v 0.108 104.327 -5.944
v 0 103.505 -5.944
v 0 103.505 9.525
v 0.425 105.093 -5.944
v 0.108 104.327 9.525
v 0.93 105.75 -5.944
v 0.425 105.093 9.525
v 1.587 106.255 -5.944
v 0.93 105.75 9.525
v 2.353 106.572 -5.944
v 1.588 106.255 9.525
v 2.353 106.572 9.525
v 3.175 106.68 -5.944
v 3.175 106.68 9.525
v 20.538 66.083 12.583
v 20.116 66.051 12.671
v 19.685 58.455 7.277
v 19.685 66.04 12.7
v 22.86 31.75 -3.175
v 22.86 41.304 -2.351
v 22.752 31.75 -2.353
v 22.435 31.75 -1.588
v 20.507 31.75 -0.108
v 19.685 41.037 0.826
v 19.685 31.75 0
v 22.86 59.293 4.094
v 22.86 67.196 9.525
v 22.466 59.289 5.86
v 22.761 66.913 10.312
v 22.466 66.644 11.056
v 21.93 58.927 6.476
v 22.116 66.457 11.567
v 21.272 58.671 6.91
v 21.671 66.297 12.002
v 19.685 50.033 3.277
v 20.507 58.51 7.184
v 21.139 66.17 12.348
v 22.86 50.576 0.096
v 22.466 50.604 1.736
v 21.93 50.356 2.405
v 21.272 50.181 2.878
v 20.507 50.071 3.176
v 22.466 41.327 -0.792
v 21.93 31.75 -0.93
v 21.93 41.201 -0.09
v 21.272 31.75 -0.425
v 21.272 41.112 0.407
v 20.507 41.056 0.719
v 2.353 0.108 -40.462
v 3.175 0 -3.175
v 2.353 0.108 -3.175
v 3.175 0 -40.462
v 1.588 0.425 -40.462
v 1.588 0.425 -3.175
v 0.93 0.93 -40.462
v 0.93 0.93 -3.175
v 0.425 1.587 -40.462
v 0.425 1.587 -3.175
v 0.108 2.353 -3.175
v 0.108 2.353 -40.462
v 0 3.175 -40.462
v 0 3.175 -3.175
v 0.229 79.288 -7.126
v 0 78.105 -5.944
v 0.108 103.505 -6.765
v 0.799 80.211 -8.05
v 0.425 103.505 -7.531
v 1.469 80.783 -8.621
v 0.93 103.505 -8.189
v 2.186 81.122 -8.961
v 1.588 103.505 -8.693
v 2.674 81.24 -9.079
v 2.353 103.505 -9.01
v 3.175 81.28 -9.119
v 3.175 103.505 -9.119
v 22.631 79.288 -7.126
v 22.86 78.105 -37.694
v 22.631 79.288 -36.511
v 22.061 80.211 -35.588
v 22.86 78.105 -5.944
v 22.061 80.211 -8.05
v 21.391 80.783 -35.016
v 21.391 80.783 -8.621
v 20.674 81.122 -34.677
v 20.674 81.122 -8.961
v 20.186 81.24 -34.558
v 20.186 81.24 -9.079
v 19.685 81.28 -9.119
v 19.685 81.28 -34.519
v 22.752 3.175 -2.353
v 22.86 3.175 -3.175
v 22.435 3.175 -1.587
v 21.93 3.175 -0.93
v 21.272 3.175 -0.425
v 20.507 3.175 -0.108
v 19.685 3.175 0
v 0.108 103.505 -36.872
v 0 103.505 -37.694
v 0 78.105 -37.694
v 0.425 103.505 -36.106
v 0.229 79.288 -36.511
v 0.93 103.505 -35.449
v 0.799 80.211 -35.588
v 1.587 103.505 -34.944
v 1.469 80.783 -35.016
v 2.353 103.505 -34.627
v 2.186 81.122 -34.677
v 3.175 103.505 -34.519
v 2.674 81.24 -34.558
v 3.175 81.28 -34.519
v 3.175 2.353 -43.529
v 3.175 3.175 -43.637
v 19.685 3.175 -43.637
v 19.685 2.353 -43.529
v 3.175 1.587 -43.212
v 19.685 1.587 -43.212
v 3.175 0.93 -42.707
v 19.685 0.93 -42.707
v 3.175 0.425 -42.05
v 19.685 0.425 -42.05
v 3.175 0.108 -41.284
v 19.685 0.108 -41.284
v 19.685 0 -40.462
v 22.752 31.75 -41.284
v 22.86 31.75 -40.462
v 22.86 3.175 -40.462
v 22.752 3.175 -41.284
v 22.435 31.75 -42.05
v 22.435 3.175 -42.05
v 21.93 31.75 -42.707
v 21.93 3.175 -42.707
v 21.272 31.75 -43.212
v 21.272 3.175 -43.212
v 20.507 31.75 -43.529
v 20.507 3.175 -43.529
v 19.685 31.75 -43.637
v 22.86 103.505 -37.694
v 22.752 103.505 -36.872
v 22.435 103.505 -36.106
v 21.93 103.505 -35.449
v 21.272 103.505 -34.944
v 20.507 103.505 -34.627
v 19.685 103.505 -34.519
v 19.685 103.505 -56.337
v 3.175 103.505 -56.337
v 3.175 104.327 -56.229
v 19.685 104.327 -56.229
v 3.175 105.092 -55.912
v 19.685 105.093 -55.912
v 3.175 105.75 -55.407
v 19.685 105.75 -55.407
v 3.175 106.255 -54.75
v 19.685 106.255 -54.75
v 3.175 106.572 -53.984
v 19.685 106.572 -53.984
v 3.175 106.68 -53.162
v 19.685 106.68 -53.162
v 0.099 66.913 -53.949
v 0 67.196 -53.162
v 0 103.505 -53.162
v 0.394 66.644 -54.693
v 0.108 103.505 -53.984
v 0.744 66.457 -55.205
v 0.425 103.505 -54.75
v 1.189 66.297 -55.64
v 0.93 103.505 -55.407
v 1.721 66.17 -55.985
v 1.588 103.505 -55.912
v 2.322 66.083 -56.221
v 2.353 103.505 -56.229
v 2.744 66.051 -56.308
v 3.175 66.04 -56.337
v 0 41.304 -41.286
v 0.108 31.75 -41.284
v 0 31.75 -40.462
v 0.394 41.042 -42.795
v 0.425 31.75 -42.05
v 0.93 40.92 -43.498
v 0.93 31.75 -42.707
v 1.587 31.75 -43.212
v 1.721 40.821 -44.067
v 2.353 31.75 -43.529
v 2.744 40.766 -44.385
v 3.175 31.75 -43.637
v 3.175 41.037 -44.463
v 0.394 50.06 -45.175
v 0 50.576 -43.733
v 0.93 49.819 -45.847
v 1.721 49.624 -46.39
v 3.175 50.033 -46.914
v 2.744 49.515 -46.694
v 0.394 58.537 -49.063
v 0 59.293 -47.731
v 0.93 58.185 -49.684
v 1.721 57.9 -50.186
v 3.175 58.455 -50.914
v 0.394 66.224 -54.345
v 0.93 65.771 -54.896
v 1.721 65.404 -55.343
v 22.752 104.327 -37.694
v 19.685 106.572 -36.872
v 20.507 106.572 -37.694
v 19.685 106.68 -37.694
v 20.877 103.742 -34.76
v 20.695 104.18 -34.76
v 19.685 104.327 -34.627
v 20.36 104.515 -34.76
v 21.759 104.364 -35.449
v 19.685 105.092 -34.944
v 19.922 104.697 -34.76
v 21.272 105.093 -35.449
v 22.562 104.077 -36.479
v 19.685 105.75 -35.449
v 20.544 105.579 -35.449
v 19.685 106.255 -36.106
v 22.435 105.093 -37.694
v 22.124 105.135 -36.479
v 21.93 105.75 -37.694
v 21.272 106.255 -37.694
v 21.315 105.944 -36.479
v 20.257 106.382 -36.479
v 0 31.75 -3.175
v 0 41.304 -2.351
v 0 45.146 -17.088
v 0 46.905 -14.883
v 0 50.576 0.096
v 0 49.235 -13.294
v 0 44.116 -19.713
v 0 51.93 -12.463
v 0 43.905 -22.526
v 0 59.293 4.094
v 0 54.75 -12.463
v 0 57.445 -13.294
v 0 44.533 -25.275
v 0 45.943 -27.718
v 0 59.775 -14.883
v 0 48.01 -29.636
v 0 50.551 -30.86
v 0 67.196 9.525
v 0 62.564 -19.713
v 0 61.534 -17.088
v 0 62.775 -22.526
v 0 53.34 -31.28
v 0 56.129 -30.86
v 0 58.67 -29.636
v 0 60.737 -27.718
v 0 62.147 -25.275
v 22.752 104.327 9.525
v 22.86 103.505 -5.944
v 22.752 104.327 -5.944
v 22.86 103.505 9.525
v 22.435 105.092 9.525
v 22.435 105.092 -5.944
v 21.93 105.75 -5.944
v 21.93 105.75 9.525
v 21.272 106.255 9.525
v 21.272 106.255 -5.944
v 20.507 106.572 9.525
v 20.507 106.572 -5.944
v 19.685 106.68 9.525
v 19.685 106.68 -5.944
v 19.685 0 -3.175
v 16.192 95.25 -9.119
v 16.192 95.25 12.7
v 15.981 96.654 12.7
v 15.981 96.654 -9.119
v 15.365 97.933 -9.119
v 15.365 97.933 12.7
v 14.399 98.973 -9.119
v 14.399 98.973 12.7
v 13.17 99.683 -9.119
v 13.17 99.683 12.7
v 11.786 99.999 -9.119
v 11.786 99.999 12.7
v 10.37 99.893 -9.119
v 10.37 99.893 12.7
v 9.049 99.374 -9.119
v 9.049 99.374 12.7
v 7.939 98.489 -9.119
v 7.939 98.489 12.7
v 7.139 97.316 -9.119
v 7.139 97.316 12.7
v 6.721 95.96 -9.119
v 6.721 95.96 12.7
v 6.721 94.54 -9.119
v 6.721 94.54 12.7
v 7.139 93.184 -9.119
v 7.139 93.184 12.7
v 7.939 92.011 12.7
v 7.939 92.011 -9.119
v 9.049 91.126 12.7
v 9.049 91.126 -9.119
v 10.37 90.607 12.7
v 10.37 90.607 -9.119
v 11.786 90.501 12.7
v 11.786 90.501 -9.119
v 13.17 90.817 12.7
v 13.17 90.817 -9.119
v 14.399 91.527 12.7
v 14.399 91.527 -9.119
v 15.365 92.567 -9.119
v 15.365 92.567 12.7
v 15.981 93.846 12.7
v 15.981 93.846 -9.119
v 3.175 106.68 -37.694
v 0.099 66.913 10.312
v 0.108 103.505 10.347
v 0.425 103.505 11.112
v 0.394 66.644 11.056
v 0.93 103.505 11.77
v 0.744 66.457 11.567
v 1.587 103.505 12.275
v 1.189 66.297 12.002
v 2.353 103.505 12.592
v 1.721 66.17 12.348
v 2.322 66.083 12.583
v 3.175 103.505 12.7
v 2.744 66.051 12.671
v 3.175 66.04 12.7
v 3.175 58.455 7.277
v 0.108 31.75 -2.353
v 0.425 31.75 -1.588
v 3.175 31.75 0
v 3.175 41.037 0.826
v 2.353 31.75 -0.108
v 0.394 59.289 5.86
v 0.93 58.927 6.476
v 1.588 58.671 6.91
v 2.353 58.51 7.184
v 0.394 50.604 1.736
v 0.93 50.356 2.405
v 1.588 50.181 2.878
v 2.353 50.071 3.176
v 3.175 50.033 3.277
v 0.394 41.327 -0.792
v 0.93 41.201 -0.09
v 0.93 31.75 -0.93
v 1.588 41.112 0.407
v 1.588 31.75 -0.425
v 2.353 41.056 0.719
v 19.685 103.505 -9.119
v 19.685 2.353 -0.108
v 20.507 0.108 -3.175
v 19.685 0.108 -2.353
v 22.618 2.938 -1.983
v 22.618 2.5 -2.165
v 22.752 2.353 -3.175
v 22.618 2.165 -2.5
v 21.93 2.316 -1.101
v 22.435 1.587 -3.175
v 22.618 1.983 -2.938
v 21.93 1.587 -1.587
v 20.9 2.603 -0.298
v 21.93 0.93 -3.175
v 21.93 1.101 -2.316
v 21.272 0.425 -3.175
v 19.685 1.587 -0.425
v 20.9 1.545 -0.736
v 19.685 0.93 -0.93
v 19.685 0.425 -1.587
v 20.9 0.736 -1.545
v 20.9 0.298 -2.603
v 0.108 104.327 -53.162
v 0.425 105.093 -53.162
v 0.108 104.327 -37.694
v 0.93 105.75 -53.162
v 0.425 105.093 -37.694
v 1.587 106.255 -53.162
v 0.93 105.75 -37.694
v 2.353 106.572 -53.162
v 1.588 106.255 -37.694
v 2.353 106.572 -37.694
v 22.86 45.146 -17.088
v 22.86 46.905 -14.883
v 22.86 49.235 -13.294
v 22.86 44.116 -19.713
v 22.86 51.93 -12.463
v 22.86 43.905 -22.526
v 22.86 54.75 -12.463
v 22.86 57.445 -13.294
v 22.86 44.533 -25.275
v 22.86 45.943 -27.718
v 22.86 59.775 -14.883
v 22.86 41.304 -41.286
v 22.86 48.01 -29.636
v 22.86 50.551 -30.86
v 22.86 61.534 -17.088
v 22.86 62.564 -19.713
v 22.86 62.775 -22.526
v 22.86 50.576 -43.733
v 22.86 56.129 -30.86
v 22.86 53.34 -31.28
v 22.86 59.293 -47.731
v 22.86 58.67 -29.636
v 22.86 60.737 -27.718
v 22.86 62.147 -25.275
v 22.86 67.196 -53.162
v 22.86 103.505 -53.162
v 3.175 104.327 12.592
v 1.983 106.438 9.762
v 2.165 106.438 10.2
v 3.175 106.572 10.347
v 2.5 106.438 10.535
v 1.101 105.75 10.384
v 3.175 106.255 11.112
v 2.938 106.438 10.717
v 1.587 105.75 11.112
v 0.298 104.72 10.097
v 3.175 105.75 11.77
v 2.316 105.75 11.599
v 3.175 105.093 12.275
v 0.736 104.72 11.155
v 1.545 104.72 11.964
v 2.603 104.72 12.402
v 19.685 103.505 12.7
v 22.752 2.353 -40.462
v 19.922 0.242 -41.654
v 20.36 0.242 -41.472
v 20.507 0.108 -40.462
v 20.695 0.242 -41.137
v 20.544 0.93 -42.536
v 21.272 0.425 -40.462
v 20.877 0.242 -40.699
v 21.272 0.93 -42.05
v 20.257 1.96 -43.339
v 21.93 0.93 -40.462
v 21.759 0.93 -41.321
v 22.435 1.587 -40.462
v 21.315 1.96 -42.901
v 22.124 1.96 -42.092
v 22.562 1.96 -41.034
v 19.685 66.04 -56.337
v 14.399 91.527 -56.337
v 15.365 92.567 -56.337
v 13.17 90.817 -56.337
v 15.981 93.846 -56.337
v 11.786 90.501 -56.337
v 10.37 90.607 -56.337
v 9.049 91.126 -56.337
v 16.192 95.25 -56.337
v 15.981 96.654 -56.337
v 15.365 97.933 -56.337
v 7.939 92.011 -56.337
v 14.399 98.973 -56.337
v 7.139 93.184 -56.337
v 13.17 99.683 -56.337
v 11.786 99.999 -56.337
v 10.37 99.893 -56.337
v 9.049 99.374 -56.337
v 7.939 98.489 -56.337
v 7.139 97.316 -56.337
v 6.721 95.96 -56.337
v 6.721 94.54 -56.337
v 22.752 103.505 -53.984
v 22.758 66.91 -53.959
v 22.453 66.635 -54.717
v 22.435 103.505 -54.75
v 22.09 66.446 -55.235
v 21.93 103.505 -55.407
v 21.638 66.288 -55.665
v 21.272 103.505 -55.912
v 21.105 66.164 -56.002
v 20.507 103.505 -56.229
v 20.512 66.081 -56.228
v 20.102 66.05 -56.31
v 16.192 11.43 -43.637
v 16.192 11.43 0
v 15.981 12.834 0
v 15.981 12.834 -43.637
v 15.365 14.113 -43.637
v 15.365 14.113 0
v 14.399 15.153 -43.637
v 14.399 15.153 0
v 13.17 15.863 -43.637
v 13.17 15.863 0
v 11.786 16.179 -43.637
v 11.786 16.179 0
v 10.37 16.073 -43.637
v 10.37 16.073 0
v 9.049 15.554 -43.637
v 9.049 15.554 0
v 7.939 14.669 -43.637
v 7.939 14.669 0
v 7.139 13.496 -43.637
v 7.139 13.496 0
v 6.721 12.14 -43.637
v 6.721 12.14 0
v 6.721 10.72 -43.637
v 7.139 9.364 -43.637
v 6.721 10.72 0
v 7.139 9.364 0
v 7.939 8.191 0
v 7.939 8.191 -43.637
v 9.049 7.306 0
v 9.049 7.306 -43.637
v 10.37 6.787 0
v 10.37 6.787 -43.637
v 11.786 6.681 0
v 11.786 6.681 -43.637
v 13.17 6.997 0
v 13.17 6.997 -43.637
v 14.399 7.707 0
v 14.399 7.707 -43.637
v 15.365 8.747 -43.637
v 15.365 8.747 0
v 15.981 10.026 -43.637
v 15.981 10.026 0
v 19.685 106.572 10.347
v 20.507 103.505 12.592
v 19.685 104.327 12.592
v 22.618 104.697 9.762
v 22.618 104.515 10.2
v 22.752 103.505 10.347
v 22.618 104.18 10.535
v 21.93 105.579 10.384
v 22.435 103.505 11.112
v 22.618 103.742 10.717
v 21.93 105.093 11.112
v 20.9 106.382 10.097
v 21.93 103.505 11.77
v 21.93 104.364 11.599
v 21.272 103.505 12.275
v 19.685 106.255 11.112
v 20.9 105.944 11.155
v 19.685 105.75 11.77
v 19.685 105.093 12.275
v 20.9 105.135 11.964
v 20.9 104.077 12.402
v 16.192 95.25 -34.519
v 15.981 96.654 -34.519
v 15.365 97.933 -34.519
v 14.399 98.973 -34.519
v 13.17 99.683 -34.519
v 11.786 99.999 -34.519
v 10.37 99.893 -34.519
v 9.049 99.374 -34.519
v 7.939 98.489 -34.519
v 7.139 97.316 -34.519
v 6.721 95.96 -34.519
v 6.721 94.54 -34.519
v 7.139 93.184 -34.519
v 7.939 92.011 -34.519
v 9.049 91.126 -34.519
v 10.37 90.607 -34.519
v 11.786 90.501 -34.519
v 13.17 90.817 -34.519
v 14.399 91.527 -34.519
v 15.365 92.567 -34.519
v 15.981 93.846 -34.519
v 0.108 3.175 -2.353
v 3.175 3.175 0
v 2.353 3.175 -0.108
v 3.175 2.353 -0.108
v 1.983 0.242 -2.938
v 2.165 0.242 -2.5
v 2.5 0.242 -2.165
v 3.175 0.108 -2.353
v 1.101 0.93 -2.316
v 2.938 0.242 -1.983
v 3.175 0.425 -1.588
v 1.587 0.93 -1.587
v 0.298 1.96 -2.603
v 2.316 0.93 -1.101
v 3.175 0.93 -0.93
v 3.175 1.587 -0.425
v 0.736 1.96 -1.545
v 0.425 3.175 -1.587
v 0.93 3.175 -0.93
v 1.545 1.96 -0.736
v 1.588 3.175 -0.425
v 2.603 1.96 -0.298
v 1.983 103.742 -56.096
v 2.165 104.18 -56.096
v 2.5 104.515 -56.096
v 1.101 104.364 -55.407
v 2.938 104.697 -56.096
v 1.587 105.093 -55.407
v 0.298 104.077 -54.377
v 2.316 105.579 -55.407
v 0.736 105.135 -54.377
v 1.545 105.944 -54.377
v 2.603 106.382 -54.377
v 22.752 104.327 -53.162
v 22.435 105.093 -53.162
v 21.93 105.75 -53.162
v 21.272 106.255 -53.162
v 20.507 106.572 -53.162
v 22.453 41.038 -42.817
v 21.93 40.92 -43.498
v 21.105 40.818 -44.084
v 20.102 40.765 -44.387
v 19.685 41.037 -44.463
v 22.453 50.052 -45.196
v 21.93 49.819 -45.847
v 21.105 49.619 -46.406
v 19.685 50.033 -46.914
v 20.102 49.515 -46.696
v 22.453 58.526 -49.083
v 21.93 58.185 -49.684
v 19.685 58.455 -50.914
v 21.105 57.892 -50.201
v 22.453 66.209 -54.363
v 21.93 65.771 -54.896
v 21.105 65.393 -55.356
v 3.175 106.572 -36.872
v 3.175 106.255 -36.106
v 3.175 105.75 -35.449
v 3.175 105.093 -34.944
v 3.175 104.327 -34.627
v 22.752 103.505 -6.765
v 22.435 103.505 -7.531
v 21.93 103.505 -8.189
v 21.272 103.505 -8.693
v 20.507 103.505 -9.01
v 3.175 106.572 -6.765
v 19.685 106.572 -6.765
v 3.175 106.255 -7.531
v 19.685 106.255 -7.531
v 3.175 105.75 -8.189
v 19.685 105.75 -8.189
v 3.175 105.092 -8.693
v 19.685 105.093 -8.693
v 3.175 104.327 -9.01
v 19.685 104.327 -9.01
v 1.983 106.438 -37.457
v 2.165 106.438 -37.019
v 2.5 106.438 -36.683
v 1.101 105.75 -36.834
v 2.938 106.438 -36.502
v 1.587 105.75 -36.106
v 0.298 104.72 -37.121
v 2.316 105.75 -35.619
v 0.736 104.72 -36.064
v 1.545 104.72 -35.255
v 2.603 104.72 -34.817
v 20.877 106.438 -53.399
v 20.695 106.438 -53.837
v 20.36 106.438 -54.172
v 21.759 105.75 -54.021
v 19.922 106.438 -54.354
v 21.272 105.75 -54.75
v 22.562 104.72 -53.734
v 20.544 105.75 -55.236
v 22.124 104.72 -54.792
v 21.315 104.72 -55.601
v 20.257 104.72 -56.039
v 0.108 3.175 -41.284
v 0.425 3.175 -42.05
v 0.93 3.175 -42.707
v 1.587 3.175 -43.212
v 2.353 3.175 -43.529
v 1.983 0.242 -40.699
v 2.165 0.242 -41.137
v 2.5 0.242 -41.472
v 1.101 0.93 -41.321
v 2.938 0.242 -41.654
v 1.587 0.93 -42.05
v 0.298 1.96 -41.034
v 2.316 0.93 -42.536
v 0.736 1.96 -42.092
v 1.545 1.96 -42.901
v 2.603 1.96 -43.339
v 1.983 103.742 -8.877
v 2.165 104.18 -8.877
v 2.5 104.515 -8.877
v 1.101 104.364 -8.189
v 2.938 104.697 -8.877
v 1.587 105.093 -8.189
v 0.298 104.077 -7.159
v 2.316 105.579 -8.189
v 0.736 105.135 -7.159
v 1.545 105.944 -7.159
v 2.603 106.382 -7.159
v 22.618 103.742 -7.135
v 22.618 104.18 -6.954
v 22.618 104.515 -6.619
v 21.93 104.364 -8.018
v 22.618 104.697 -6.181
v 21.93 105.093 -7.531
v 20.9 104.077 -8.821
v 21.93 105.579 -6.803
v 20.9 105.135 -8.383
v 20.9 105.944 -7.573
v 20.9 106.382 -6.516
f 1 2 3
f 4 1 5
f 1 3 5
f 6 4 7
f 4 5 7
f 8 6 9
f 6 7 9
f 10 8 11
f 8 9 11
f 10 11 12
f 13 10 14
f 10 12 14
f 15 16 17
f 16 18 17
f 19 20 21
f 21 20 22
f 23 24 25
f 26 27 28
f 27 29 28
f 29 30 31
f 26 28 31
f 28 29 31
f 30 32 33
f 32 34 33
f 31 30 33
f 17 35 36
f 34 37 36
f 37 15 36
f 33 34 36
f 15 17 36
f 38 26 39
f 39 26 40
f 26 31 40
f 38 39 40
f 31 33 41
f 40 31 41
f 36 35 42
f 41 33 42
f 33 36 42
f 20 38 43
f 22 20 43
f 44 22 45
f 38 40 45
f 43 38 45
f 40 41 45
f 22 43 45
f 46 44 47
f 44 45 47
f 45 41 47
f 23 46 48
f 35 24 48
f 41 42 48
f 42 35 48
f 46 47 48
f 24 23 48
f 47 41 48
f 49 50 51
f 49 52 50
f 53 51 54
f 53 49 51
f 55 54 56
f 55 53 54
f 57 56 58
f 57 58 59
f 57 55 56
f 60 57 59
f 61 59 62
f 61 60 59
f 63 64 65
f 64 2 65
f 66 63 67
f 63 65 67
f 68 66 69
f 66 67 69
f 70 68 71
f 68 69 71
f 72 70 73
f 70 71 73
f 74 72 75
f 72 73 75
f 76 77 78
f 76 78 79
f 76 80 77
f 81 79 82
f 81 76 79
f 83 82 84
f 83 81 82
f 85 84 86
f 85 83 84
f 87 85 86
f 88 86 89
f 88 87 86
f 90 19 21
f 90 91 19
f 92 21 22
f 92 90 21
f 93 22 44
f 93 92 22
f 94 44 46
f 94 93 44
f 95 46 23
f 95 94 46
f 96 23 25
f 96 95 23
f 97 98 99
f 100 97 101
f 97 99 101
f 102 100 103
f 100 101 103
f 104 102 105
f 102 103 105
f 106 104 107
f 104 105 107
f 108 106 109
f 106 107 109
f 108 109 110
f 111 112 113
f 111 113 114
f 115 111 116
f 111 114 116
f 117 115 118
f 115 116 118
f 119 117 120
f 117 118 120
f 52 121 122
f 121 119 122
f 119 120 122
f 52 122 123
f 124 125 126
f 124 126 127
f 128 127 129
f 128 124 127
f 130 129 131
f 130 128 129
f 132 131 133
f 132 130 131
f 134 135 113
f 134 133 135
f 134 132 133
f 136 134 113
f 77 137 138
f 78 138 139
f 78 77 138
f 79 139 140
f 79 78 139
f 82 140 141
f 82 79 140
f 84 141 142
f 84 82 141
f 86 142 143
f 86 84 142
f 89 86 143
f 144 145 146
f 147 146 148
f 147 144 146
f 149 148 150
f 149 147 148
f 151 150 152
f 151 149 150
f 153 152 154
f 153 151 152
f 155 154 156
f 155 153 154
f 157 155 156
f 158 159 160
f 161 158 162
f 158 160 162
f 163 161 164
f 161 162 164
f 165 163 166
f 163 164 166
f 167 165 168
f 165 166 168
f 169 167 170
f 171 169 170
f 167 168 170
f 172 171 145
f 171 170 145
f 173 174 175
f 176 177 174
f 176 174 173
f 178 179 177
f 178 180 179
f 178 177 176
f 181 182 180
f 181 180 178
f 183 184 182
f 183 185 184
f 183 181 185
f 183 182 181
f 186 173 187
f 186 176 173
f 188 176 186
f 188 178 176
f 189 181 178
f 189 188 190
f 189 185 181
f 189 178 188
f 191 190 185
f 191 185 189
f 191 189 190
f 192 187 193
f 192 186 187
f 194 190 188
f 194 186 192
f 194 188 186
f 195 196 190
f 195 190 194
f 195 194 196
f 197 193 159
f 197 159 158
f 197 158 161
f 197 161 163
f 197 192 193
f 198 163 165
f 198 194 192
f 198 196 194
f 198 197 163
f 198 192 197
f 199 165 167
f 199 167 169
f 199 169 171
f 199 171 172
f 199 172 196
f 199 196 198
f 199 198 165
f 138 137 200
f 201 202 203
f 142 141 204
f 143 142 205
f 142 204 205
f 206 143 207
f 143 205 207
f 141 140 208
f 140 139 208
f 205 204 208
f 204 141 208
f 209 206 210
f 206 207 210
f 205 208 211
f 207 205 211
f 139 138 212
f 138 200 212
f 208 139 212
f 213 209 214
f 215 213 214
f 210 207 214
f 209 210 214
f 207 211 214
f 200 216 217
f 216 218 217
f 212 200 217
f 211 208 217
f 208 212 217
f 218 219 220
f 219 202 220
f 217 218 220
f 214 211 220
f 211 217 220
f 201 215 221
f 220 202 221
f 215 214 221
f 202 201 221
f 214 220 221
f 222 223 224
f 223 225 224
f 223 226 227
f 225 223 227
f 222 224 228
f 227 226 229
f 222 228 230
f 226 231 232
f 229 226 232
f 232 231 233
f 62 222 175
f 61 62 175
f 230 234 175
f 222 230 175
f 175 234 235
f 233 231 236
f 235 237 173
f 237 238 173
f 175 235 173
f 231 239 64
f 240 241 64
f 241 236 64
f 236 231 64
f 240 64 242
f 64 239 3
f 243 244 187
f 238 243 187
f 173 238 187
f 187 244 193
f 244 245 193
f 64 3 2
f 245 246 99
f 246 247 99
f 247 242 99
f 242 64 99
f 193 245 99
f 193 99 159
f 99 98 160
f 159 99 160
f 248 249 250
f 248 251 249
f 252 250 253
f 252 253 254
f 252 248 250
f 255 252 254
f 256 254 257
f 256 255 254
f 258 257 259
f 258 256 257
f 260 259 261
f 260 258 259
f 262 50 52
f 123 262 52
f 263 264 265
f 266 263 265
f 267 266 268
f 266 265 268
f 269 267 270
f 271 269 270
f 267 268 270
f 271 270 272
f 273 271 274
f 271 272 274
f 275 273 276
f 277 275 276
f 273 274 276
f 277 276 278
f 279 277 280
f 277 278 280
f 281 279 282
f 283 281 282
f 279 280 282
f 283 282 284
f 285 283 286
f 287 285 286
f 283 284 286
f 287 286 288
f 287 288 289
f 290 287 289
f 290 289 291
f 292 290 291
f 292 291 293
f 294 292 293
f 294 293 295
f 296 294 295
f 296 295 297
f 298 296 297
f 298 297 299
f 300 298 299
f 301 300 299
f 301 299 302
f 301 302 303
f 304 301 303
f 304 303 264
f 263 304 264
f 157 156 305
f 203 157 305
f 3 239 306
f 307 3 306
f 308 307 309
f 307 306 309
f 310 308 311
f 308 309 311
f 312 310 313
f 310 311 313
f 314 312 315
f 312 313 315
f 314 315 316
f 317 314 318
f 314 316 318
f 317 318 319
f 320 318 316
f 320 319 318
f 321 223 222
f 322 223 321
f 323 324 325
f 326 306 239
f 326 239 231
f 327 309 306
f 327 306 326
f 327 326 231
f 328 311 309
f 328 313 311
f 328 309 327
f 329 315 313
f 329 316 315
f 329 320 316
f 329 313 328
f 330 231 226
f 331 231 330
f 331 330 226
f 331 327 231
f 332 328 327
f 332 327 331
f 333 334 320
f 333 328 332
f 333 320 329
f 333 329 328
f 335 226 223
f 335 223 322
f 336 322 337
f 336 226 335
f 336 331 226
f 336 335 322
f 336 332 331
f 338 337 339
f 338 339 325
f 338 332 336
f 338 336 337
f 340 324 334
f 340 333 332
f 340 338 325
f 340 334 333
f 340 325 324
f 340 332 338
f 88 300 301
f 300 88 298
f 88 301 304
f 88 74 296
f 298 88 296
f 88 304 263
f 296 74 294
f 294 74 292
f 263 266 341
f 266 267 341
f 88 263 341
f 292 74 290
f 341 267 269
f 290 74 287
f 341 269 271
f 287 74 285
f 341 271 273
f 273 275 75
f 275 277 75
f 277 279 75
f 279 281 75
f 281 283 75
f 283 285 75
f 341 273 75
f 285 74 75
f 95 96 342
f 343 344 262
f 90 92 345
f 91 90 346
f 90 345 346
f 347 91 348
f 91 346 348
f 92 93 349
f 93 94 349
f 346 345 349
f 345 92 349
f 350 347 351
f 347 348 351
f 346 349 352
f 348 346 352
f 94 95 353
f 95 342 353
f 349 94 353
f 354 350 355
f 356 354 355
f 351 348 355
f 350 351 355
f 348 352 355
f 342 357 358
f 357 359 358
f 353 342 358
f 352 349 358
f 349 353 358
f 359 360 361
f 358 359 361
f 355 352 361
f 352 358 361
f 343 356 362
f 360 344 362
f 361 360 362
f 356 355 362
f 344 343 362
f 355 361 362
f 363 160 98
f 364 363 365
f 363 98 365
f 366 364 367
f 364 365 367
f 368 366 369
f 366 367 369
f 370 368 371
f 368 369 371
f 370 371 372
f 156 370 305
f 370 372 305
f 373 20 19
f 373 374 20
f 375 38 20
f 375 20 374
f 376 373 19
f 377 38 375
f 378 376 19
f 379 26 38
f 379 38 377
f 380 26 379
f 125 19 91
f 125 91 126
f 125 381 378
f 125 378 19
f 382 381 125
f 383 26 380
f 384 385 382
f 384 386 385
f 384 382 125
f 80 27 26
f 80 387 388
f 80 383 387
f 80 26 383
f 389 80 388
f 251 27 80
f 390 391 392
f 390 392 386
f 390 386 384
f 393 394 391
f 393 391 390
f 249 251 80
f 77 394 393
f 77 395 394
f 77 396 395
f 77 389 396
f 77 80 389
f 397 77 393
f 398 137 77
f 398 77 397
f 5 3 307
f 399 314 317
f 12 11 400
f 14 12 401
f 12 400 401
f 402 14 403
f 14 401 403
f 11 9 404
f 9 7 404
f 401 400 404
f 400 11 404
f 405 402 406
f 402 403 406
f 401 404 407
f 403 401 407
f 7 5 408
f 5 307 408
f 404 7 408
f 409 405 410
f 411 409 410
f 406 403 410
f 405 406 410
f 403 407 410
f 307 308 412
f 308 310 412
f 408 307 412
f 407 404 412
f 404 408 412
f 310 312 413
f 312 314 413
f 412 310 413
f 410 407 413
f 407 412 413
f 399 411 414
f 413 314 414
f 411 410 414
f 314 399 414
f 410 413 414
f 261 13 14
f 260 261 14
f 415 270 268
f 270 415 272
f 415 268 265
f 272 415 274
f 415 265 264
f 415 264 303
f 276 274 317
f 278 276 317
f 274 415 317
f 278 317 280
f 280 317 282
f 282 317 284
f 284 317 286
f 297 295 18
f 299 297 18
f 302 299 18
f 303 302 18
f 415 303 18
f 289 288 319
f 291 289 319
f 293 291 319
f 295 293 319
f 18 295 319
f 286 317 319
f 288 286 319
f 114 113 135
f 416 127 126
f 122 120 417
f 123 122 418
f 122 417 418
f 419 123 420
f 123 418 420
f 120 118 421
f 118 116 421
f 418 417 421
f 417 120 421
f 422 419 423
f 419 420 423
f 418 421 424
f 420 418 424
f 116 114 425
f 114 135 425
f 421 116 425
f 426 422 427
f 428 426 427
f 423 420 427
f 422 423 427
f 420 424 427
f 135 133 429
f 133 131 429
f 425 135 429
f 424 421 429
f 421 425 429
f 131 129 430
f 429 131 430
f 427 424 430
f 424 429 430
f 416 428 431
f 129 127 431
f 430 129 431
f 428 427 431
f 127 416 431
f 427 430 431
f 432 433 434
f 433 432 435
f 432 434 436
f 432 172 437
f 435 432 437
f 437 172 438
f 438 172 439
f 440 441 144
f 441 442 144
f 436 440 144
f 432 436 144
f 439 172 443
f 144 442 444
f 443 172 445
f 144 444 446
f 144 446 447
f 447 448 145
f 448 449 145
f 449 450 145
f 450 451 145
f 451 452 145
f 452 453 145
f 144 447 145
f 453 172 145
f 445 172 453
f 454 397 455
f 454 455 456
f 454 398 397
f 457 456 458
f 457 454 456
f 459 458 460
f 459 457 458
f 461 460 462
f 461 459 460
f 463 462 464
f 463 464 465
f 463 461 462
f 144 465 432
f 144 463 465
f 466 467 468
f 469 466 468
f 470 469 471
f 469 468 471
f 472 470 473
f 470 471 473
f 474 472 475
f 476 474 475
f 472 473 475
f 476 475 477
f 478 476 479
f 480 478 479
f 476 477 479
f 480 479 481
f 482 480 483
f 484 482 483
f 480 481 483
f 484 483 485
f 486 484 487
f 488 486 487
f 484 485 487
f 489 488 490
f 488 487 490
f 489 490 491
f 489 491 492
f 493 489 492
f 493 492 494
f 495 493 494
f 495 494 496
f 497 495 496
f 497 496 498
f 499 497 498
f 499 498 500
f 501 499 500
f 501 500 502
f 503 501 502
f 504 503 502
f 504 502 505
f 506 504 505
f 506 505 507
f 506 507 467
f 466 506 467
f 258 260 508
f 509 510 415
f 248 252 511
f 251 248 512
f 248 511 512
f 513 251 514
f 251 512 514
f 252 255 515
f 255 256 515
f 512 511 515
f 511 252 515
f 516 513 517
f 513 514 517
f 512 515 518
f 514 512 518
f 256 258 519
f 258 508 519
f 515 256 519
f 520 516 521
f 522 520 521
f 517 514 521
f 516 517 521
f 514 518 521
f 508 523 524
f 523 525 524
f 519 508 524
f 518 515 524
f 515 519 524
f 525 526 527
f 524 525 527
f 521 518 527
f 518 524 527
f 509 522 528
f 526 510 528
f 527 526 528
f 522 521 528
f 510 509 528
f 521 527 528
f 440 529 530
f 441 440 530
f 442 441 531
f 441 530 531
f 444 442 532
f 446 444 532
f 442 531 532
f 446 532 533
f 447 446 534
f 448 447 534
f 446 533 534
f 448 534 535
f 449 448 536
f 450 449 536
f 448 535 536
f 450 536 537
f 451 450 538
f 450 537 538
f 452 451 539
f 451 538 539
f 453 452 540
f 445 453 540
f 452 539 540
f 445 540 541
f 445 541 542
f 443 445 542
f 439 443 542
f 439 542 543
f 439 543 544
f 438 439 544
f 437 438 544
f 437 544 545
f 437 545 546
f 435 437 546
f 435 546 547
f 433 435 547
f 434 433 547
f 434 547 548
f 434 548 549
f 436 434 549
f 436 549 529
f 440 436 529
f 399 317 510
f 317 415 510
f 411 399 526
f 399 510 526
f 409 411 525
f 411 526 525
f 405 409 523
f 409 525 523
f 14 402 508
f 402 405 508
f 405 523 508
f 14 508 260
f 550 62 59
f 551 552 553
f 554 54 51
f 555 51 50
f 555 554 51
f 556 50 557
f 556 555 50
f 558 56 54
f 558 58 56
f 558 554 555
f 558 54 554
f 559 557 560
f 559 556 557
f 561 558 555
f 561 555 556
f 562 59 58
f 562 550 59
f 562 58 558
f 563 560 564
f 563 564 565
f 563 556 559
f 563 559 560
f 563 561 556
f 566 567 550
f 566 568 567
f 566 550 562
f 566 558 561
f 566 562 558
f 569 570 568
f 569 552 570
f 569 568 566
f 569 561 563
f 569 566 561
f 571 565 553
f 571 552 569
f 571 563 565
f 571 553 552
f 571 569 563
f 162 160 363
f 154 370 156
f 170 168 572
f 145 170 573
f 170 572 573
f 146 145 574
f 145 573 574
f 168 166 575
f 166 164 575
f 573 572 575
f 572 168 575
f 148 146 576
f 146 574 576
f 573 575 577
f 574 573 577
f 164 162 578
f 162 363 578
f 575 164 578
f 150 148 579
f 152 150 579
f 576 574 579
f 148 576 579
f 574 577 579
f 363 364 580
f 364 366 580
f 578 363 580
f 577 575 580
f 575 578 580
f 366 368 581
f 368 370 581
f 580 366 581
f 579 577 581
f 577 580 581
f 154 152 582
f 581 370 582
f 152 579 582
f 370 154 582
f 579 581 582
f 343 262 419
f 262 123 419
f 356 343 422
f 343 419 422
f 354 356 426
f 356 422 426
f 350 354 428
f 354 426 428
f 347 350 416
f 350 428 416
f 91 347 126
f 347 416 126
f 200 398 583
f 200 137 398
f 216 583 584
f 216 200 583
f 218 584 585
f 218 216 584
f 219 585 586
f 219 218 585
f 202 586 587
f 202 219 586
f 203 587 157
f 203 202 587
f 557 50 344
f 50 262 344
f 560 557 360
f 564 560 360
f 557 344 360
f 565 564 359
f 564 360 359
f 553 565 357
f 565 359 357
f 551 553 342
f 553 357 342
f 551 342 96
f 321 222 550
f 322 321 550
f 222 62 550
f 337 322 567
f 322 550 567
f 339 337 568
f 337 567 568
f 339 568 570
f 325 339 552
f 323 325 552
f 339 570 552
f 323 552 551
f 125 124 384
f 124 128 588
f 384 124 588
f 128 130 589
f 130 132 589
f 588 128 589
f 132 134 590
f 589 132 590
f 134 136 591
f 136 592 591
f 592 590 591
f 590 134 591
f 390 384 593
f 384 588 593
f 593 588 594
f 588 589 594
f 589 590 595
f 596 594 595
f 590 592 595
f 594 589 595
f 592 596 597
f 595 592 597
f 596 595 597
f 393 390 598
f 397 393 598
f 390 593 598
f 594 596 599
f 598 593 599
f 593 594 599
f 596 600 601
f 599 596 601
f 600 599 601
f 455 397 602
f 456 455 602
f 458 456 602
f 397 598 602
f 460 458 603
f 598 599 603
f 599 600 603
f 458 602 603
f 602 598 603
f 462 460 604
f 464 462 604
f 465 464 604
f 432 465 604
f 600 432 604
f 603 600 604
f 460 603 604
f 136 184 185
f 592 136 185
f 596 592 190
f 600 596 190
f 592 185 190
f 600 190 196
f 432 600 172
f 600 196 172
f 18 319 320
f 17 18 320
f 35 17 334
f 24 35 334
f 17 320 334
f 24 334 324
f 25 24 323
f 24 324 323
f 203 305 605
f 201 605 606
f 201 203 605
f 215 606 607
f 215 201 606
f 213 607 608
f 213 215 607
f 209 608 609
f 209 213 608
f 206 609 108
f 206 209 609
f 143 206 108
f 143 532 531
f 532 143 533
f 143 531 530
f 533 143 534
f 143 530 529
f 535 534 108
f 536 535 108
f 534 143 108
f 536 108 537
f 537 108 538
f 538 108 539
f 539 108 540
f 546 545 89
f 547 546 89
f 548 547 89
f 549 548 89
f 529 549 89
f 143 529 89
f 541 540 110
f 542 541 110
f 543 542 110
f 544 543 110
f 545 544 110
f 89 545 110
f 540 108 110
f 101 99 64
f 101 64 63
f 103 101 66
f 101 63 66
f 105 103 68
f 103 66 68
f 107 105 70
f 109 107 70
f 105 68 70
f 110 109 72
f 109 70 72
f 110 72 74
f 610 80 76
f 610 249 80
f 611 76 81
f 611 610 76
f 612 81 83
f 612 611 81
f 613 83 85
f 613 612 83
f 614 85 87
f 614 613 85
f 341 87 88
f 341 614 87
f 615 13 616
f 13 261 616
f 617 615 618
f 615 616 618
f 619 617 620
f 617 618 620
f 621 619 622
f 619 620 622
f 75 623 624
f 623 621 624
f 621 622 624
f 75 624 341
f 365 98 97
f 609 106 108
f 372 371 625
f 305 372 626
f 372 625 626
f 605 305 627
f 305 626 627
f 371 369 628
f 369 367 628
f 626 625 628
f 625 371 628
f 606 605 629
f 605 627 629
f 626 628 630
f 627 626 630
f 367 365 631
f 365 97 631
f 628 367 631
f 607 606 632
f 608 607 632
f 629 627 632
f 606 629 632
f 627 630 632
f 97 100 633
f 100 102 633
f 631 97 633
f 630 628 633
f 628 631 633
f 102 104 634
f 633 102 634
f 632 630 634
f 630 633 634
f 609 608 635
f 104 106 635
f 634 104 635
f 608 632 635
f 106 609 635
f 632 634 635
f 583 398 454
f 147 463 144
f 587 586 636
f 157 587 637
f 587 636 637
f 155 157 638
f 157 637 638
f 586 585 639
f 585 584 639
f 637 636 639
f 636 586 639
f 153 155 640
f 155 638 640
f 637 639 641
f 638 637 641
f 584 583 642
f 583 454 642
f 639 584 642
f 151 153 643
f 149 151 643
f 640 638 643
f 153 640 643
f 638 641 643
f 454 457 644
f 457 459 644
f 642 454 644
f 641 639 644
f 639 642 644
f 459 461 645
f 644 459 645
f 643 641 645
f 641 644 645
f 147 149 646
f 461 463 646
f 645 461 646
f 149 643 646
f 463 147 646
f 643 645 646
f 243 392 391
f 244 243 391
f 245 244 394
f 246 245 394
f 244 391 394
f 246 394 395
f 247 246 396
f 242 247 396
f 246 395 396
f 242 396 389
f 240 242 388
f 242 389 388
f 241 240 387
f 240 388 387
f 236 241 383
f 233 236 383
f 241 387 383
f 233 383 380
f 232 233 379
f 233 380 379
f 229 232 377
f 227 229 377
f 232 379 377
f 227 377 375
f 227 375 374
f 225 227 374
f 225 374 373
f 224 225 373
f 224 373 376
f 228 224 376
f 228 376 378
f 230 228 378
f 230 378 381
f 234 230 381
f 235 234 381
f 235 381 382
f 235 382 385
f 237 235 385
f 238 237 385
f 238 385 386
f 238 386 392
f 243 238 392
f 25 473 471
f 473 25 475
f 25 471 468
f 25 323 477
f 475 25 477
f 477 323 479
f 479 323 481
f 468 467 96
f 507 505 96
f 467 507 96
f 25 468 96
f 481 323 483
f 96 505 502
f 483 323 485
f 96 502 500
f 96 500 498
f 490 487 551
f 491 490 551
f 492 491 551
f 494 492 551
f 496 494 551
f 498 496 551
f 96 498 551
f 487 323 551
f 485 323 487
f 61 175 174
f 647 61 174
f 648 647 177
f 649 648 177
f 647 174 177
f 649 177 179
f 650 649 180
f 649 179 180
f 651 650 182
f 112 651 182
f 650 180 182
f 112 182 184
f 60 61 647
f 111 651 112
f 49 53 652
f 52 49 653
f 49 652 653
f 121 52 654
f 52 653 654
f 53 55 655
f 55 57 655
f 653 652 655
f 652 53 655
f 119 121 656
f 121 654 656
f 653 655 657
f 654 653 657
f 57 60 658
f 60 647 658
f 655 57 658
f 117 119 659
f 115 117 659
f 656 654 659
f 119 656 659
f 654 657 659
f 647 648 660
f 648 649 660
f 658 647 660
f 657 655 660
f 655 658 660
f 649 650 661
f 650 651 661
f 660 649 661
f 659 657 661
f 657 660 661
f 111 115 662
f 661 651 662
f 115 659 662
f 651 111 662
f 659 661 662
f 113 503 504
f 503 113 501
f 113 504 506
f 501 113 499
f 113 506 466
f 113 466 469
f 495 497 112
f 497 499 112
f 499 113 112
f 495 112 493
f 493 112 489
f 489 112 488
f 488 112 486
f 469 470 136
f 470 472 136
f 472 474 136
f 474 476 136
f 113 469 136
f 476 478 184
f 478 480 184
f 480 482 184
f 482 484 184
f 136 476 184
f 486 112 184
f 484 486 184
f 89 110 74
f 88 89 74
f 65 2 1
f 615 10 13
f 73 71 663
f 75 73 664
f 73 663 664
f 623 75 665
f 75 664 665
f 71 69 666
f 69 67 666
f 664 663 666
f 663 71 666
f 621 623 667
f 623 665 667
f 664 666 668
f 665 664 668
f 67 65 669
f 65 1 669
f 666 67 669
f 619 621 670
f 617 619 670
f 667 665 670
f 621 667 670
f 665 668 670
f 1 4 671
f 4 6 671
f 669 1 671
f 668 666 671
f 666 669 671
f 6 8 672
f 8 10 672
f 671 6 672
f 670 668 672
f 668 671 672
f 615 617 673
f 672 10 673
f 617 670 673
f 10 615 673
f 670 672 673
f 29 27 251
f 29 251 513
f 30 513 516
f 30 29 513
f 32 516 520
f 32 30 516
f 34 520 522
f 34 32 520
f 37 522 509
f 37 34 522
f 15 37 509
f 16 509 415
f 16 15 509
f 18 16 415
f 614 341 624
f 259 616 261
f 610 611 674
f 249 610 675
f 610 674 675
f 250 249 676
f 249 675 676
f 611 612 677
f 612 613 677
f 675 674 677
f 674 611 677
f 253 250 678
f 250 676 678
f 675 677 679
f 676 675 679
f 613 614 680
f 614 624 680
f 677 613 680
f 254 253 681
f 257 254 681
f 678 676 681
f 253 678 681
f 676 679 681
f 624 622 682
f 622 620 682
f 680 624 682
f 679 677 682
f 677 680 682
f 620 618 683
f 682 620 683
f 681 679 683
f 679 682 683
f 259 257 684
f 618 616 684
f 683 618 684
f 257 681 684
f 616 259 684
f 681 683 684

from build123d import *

# Parameters (mm, degrees)
BOSS_EXTRUDE1_DEPTH = 22.86
SKETCH2_R           = 4.7625
CUT_EXTRUDE1_DEPTH  = 70.0372
SKETCH3_R           = 9.4615
CUT_EXTRUDE2_DEPTH  = 23.86
FILLET1_R           = 3.175


with BuildPart() as part:
    # Sketch1 → Boss-Extrude1 (new body)
    with BuildSketch(Plane(origin=(0, 0, 0), x_dir=(0, 0, -1), z_dir=(1, 0, 0))):
        with BuildLine():
            Line((43.6372, 0), (43.6372, 31.75))
            ThreePointArc((43.6372, 31.75), (46.914198612, 50.033148662), (56.3372, 66.04))
            Line((56.3372, 66.04), (56.3372, 106.68))
            Line((56.3372, 106.68), (34.5186, 106.68))
            Line((34.5186, 106.68), (34.5186, 81.28))
            Line((34.5186, 81.28), (9.1186, 81.28))
            Line((9.1186, 81.28), (9.1186, 106.68))
            Line((9.1186, 106.68), (-12.7, 106.68))
            Line((-12.7, 106.68), (-12.7, 66.04))
            ThreePointArc((-12.7, 66.04), (-3.276998612, 50.033148662), (0, 31.75))
            Line((0, 31.75), (0, 0))
            Line((0, 0), (43.6372, 0))
        make_face()
    extrude(amount=BOSS_EXTRUDE1_DEPTH)

    # Sketch2 → Cut-Extrude1 (cut, through all)
    with BuildSketch(Plane.XY.offset(12.7)):
        with Locations((11.43, 95.25)):
            Circle(SKETCH2_R)
        with Locations((11.43, 11.43)):
            Circle(SKETCH2_R)
    extrude(amount=-CUT_EXTRUDE1_DEPTH, mode=Mode.SUBTRACT)

    # Sketch3 → Cut-Extrude2 (cut, through all)
    with BuildSketch(Plane(origin=(22.86, 0, 0), x_dir=(0, 0, -1), z_dir=(1, 0, 0))):
        with Locations((21.8186, 53.34)):
            Circle(SKETCH3_R)
    extrude(amount=-CUT_EXTRUDE2_DEPTH, mode=Mode.SUBTRACT)

    # Fillet1
    fillet1_edges = [part.edges().sort_by_distance(p)[0] for p in [
        (22.86, 50.033148662, -46.914198612),
        (0, 15.875, 0),
        (0, 50.033148662, 3.276998612),
        (0, 86.36, 12.7),
        (0, 106.68, 1.7907),
        (0, 93.98, -9.1186),
        (0, 81.28, -21.8186),
        (22.86, 86.36, -56.3372),
        (0, 93.98, -34.5186),
        (0, 106.68, -45.4279),
        (0, 86.36, -56.3372),
        (0, 50.033148662, -46.914198612),
        (0, 15.875, -43.6372),
        (0, 0, -21.8186),
        (22.86, 106.68, -45.4279),
        (22.86, 93.98, -34.5186),
        (11.43, 0, 0),
        (11.43, 106.68, 12.7),
        (11.43, 106.68, -9.1186),
        (11.43, 106.68, -34.5186),
        (11.43, 106.68, -56.3372),
        (11.43, 0, -43.6372),
        (22.86, 81.28, -21.8186),
        (22.86, 93.98, -9.1186),
        (22.86, 106.68, 1.7907),
        (22.86, 86.36, 12.7),
        (22.86, 50.033148662, 3.276998612),
        (22.86, 15.875, 0),
        (22.86, 0, -21.8186),
        (22.86, 15.875, -43.6372),
    ]]
    fillet(fillet1_edges, radius=FILLET1_R)


solid = part.part
